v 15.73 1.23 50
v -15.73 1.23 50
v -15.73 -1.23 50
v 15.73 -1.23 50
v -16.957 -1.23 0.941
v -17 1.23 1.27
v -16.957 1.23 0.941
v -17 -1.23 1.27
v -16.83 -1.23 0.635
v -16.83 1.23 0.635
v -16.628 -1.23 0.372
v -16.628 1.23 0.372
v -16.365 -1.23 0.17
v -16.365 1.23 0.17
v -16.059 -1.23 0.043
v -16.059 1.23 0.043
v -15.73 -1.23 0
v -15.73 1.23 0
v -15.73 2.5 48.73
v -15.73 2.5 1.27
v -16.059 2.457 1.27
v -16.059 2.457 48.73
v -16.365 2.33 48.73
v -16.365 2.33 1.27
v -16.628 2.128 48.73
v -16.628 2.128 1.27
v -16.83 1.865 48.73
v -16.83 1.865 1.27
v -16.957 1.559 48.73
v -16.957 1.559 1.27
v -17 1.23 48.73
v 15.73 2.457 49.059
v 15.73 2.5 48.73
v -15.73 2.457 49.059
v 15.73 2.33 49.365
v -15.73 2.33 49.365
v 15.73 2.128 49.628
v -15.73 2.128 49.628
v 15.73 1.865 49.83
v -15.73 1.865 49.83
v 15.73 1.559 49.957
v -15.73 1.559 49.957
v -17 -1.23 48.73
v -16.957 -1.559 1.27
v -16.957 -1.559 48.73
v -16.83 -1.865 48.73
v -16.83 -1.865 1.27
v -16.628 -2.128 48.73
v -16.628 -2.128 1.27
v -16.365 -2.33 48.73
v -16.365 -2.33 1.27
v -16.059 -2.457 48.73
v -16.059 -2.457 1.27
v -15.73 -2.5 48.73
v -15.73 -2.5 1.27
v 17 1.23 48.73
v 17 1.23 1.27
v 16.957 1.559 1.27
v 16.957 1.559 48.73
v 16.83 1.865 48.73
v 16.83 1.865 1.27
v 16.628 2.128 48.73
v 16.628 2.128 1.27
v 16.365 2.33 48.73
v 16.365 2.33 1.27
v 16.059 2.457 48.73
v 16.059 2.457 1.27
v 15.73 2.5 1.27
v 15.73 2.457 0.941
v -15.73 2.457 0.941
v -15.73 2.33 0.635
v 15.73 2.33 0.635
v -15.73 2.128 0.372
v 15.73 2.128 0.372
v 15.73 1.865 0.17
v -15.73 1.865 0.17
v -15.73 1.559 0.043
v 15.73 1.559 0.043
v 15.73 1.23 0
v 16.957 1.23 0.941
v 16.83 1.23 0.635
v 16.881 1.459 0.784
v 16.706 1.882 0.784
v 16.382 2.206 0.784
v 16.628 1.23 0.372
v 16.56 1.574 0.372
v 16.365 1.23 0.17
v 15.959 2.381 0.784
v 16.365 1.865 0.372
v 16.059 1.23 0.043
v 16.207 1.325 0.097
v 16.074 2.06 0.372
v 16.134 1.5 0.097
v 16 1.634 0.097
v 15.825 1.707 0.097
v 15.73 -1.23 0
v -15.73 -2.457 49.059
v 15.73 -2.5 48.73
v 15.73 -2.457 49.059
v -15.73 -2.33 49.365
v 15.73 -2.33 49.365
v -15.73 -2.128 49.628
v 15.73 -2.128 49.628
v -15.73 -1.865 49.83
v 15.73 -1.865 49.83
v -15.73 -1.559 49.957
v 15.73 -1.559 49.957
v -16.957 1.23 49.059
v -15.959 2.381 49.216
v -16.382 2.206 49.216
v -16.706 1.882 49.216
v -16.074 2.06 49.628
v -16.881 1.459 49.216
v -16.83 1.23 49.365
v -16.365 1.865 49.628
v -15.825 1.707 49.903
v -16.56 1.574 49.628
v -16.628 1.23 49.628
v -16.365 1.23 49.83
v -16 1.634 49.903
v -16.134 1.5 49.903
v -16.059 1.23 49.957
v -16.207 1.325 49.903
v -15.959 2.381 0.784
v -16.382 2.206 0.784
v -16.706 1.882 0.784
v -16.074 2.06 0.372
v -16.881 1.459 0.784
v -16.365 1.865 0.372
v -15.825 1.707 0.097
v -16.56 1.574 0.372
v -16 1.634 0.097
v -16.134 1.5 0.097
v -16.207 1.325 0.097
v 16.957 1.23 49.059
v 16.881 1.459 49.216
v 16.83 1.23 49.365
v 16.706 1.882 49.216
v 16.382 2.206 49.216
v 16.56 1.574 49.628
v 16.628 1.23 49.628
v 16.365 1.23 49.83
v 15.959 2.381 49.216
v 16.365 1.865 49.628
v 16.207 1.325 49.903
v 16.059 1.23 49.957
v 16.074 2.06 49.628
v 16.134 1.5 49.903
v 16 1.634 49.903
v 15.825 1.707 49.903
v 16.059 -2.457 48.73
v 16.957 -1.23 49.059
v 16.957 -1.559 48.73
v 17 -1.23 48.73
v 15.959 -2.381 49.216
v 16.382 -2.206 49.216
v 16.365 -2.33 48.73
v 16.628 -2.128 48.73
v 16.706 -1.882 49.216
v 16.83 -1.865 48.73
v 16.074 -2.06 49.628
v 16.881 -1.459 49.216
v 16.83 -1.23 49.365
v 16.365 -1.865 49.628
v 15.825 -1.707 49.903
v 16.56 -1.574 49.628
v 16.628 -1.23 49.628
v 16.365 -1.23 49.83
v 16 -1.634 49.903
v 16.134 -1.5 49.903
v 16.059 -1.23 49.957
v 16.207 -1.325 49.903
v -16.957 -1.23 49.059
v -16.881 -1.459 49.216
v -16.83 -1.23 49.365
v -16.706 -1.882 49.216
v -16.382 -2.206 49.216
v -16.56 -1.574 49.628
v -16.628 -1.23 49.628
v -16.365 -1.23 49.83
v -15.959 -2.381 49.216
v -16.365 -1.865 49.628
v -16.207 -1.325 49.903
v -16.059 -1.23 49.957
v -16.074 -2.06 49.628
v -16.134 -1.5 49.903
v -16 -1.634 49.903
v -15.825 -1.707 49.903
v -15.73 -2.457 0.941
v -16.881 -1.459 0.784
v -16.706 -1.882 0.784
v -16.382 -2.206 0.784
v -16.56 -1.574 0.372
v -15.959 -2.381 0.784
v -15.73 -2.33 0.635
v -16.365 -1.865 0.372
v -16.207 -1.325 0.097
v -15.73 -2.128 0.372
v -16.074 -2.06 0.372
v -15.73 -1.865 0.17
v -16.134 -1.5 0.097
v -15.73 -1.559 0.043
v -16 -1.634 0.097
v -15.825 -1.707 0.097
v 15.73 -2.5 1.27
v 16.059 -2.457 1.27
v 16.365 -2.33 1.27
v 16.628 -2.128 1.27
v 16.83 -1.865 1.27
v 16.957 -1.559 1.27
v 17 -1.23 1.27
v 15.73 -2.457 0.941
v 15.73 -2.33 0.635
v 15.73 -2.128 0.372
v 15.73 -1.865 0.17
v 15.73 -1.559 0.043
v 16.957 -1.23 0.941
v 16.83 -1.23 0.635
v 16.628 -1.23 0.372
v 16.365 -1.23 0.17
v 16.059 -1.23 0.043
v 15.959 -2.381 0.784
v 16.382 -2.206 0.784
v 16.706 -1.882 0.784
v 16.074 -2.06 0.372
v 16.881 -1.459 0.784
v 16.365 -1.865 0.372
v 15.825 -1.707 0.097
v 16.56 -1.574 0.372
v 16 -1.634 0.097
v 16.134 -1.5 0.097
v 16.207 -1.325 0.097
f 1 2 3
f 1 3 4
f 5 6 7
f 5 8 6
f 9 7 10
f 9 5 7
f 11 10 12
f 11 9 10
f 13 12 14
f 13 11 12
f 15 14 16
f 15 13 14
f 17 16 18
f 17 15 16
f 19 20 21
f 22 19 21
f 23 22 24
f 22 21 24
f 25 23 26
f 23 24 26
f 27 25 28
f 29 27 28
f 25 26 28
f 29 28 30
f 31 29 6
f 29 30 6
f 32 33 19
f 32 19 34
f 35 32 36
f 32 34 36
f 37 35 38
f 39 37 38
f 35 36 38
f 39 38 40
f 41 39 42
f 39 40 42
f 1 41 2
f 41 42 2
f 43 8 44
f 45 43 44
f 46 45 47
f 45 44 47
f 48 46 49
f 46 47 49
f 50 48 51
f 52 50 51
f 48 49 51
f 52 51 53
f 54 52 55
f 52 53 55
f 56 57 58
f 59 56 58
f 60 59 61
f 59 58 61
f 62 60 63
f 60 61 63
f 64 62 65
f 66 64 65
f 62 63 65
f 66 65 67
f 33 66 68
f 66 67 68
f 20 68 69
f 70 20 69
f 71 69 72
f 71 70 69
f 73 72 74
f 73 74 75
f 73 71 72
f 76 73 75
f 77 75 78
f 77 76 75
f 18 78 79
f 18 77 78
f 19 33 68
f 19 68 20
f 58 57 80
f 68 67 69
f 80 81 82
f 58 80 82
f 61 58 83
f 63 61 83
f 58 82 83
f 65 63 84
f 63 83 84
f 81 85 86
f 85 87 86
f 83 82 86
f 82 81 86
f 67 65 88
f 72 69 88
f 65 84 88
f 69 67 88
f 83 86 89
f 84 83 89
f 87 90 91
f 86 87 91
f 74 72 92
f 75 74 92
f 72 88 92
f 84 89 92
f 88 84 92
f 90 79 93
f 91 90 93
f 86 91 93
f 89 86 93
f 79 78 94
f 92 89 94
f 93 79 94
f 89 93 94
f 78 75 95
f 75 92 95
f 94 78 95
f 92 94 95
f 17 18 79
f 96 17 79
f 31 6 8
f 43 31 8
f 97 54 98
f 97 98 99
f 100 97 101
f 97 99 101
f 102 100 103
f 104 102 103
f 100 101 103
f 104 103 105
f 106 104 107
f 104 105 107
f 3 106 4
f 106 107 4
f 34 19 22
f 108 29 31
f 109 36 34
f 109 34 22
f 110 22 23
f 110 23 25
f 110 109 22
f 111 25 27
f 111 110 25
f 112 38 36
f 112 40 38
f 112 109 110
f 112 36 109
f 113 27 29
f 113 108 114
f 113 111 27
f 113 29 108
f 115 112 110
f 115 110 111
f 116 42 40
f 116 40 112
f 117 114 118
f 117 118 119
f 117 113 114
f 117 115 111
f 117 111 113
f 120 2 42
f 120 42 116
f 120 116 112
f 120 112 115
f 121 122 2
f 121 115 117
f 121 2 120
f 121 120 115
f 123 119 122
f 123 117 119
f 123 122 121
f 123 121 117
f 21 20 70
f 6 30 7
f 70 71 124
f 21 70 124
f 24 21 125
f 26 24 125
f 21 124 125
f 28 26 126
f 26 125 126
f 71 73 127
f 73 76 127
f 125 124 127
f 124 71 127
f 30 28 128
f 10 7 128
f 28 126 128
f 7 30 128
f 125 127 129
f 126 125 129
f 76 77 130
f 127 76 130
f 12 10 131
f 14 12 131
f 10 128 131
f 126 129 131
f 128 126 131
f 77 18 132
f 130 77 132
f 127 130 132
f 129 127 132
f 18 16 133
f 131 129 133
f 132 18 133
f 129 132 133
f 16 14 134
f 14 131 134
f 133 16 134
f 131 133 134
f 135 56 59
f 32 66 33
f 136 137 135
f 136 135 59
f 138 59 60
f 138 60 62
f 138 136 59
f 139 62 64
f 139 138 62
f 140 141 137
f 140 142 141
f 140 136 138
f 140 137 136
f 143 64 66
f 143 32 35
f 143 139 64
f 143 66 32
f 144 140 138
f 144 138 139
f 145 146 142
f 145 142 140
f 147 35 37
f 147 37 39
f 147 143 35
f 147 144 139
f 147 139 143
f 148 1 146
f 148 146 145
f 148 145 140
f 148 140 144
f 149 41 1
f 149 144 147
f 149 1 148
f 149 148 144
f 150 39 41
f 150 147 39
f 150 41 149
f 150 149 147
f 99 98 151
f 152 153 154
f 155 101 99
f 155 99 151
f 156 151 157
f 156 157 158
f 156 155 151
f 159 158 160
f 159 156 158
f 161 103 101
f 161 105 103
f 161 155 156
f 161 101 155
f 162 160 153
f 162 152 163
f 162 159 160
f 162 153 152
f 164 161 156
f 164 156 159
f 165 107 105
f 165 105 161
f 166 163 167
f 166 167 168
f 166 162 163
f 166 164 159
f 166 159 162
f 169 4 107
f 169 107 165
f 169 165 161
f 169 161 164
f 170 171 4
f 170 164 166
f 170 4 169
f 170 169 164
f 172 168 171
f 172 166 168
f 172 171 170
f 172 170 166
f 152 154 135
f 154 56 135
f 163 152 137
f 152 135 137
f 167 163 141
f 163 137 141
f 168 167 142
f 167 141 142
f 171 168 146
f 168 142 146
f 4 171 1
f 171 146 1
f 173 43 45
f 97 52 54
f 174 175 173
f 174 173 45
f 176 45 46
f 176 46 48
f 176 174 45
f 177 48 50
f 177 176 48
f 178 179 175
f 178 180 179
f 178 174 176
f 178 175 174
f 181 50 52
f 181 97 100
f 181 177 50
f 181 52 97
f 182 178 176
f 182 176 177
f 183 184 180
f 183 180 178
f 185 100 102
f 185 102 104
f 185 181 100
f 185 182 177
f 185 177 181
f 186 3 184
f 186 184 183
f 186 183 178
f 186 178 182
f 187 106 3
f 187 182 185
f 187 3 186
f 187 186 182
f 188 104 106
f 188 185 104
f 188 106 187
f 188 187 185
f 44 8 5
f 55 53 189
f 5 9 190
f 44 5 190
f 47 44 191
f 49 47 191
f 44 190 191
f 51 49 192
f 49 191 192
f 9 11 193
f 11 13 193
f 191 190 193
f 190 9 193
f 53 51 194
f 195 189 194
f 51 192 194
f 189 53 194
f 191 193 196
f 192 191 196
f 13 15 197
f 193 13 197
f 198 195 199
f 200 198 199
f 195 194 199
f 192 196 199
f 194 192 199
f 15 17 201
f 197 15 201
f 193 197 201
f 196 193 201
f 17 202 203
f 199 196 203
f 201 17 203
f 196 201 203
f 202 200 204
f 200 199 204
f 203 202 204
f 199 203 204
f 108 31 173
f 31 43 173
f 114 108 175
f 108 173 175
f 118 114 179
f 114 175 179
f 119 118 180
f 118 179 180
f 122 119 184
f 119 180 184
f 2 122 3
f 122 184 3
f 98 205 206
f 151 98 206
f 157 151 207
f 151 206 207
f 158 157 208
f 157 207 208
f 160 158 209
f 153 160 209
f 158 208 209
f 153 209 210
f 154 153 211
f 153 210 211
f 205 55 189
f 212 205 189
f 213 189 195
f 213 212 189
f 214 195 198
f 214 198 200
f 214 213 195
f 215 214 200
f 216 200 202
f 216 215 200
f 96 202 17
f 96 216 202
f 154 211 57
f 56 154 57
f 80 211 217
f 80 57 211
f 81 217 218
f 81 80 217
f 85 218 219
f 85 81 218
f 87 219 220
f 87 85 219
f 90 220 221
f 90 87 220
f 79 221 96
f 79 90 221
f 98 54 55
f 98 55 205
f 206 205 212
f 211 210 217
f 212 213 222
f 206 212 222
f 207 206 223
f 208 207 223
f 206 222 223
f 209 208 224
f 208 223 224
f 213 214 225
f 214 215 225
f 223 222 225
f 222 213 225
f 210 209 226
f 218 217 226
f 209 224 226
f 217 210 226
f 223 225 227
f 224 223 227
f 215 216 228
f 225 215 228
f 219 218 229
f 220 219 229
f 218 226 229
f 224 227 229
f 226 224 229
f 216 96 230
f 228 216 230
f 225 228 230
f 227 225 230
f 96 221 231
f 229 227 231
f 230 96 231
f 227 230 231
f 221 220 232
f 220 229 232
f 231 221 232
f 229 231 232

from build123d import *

# Parameters (mm, degrees)
BOSS_EXTRUDE1_DEPTH = 50.000000076
FILLET1_R           = 1.27


with BuildPart() as part:
    # Sketch2 → Boss-Extrude1 (new body)
    with BuildSketch(Plane.XY):
        with BuildLine():
            Line((-15.73, -2.5), (15.73, -2.5))
            ThreePointArc((15.73, -2.5), (16.628025612, -2.128025612), (17, -1.23))
            Line((17, -1.23), (17, 1.23))
            ThreePointArc((17, 1.23), (16.628025612, 2.128025612), (15.73, 2.5))
            Line((15.73, 2.5), (-15.73, 2.5))
            ThreePointArc((-15.73, 2.5), (-16.628025612, 2.128025612), (-17, 1.23))
            Line((-17, 1.23), (-17, -1.23))
            ThreePointArc((-17, -1.23), (-16.628025612, -2.128025612), (-15.73, -2.5))
        make_face()
    extrude(amount=BOSS_EXTRUDE1_DEPTH)

    # Fillet1
    fillet1_edges = [part.edges().sort_by_distance(p)[0] for p in [
        (17, 0, 0),
        (16.628025612, -2.128025612, 0),
        (0, -2.5, 0),
        (-16.628025612, -2.128025612, 0),
        (16.628025612, -2.128025612, 50.000000076),
        (17, 0, 50.000000076),
        (16.628025612, 2.128025612, 50.000000076),
        (0, 2.5, 50.000000076),
        (-16.628025612, 2.128025612, 50.000000076),
        (-17, 0, 50.000000076),
        (-16.628025612, -2.128025612, 50.000000076),
        (-17, 0, 0),
        (0, -2.5, 50.000000076),
        (-16.628025612, 2.128025612, 0),
        (0, 2.5, 0),
        (16.628025612, 2.128025612, 0),
    ]]
    fillet(fillet1_edges, radius=FILLET1_R)


solid = part.part
